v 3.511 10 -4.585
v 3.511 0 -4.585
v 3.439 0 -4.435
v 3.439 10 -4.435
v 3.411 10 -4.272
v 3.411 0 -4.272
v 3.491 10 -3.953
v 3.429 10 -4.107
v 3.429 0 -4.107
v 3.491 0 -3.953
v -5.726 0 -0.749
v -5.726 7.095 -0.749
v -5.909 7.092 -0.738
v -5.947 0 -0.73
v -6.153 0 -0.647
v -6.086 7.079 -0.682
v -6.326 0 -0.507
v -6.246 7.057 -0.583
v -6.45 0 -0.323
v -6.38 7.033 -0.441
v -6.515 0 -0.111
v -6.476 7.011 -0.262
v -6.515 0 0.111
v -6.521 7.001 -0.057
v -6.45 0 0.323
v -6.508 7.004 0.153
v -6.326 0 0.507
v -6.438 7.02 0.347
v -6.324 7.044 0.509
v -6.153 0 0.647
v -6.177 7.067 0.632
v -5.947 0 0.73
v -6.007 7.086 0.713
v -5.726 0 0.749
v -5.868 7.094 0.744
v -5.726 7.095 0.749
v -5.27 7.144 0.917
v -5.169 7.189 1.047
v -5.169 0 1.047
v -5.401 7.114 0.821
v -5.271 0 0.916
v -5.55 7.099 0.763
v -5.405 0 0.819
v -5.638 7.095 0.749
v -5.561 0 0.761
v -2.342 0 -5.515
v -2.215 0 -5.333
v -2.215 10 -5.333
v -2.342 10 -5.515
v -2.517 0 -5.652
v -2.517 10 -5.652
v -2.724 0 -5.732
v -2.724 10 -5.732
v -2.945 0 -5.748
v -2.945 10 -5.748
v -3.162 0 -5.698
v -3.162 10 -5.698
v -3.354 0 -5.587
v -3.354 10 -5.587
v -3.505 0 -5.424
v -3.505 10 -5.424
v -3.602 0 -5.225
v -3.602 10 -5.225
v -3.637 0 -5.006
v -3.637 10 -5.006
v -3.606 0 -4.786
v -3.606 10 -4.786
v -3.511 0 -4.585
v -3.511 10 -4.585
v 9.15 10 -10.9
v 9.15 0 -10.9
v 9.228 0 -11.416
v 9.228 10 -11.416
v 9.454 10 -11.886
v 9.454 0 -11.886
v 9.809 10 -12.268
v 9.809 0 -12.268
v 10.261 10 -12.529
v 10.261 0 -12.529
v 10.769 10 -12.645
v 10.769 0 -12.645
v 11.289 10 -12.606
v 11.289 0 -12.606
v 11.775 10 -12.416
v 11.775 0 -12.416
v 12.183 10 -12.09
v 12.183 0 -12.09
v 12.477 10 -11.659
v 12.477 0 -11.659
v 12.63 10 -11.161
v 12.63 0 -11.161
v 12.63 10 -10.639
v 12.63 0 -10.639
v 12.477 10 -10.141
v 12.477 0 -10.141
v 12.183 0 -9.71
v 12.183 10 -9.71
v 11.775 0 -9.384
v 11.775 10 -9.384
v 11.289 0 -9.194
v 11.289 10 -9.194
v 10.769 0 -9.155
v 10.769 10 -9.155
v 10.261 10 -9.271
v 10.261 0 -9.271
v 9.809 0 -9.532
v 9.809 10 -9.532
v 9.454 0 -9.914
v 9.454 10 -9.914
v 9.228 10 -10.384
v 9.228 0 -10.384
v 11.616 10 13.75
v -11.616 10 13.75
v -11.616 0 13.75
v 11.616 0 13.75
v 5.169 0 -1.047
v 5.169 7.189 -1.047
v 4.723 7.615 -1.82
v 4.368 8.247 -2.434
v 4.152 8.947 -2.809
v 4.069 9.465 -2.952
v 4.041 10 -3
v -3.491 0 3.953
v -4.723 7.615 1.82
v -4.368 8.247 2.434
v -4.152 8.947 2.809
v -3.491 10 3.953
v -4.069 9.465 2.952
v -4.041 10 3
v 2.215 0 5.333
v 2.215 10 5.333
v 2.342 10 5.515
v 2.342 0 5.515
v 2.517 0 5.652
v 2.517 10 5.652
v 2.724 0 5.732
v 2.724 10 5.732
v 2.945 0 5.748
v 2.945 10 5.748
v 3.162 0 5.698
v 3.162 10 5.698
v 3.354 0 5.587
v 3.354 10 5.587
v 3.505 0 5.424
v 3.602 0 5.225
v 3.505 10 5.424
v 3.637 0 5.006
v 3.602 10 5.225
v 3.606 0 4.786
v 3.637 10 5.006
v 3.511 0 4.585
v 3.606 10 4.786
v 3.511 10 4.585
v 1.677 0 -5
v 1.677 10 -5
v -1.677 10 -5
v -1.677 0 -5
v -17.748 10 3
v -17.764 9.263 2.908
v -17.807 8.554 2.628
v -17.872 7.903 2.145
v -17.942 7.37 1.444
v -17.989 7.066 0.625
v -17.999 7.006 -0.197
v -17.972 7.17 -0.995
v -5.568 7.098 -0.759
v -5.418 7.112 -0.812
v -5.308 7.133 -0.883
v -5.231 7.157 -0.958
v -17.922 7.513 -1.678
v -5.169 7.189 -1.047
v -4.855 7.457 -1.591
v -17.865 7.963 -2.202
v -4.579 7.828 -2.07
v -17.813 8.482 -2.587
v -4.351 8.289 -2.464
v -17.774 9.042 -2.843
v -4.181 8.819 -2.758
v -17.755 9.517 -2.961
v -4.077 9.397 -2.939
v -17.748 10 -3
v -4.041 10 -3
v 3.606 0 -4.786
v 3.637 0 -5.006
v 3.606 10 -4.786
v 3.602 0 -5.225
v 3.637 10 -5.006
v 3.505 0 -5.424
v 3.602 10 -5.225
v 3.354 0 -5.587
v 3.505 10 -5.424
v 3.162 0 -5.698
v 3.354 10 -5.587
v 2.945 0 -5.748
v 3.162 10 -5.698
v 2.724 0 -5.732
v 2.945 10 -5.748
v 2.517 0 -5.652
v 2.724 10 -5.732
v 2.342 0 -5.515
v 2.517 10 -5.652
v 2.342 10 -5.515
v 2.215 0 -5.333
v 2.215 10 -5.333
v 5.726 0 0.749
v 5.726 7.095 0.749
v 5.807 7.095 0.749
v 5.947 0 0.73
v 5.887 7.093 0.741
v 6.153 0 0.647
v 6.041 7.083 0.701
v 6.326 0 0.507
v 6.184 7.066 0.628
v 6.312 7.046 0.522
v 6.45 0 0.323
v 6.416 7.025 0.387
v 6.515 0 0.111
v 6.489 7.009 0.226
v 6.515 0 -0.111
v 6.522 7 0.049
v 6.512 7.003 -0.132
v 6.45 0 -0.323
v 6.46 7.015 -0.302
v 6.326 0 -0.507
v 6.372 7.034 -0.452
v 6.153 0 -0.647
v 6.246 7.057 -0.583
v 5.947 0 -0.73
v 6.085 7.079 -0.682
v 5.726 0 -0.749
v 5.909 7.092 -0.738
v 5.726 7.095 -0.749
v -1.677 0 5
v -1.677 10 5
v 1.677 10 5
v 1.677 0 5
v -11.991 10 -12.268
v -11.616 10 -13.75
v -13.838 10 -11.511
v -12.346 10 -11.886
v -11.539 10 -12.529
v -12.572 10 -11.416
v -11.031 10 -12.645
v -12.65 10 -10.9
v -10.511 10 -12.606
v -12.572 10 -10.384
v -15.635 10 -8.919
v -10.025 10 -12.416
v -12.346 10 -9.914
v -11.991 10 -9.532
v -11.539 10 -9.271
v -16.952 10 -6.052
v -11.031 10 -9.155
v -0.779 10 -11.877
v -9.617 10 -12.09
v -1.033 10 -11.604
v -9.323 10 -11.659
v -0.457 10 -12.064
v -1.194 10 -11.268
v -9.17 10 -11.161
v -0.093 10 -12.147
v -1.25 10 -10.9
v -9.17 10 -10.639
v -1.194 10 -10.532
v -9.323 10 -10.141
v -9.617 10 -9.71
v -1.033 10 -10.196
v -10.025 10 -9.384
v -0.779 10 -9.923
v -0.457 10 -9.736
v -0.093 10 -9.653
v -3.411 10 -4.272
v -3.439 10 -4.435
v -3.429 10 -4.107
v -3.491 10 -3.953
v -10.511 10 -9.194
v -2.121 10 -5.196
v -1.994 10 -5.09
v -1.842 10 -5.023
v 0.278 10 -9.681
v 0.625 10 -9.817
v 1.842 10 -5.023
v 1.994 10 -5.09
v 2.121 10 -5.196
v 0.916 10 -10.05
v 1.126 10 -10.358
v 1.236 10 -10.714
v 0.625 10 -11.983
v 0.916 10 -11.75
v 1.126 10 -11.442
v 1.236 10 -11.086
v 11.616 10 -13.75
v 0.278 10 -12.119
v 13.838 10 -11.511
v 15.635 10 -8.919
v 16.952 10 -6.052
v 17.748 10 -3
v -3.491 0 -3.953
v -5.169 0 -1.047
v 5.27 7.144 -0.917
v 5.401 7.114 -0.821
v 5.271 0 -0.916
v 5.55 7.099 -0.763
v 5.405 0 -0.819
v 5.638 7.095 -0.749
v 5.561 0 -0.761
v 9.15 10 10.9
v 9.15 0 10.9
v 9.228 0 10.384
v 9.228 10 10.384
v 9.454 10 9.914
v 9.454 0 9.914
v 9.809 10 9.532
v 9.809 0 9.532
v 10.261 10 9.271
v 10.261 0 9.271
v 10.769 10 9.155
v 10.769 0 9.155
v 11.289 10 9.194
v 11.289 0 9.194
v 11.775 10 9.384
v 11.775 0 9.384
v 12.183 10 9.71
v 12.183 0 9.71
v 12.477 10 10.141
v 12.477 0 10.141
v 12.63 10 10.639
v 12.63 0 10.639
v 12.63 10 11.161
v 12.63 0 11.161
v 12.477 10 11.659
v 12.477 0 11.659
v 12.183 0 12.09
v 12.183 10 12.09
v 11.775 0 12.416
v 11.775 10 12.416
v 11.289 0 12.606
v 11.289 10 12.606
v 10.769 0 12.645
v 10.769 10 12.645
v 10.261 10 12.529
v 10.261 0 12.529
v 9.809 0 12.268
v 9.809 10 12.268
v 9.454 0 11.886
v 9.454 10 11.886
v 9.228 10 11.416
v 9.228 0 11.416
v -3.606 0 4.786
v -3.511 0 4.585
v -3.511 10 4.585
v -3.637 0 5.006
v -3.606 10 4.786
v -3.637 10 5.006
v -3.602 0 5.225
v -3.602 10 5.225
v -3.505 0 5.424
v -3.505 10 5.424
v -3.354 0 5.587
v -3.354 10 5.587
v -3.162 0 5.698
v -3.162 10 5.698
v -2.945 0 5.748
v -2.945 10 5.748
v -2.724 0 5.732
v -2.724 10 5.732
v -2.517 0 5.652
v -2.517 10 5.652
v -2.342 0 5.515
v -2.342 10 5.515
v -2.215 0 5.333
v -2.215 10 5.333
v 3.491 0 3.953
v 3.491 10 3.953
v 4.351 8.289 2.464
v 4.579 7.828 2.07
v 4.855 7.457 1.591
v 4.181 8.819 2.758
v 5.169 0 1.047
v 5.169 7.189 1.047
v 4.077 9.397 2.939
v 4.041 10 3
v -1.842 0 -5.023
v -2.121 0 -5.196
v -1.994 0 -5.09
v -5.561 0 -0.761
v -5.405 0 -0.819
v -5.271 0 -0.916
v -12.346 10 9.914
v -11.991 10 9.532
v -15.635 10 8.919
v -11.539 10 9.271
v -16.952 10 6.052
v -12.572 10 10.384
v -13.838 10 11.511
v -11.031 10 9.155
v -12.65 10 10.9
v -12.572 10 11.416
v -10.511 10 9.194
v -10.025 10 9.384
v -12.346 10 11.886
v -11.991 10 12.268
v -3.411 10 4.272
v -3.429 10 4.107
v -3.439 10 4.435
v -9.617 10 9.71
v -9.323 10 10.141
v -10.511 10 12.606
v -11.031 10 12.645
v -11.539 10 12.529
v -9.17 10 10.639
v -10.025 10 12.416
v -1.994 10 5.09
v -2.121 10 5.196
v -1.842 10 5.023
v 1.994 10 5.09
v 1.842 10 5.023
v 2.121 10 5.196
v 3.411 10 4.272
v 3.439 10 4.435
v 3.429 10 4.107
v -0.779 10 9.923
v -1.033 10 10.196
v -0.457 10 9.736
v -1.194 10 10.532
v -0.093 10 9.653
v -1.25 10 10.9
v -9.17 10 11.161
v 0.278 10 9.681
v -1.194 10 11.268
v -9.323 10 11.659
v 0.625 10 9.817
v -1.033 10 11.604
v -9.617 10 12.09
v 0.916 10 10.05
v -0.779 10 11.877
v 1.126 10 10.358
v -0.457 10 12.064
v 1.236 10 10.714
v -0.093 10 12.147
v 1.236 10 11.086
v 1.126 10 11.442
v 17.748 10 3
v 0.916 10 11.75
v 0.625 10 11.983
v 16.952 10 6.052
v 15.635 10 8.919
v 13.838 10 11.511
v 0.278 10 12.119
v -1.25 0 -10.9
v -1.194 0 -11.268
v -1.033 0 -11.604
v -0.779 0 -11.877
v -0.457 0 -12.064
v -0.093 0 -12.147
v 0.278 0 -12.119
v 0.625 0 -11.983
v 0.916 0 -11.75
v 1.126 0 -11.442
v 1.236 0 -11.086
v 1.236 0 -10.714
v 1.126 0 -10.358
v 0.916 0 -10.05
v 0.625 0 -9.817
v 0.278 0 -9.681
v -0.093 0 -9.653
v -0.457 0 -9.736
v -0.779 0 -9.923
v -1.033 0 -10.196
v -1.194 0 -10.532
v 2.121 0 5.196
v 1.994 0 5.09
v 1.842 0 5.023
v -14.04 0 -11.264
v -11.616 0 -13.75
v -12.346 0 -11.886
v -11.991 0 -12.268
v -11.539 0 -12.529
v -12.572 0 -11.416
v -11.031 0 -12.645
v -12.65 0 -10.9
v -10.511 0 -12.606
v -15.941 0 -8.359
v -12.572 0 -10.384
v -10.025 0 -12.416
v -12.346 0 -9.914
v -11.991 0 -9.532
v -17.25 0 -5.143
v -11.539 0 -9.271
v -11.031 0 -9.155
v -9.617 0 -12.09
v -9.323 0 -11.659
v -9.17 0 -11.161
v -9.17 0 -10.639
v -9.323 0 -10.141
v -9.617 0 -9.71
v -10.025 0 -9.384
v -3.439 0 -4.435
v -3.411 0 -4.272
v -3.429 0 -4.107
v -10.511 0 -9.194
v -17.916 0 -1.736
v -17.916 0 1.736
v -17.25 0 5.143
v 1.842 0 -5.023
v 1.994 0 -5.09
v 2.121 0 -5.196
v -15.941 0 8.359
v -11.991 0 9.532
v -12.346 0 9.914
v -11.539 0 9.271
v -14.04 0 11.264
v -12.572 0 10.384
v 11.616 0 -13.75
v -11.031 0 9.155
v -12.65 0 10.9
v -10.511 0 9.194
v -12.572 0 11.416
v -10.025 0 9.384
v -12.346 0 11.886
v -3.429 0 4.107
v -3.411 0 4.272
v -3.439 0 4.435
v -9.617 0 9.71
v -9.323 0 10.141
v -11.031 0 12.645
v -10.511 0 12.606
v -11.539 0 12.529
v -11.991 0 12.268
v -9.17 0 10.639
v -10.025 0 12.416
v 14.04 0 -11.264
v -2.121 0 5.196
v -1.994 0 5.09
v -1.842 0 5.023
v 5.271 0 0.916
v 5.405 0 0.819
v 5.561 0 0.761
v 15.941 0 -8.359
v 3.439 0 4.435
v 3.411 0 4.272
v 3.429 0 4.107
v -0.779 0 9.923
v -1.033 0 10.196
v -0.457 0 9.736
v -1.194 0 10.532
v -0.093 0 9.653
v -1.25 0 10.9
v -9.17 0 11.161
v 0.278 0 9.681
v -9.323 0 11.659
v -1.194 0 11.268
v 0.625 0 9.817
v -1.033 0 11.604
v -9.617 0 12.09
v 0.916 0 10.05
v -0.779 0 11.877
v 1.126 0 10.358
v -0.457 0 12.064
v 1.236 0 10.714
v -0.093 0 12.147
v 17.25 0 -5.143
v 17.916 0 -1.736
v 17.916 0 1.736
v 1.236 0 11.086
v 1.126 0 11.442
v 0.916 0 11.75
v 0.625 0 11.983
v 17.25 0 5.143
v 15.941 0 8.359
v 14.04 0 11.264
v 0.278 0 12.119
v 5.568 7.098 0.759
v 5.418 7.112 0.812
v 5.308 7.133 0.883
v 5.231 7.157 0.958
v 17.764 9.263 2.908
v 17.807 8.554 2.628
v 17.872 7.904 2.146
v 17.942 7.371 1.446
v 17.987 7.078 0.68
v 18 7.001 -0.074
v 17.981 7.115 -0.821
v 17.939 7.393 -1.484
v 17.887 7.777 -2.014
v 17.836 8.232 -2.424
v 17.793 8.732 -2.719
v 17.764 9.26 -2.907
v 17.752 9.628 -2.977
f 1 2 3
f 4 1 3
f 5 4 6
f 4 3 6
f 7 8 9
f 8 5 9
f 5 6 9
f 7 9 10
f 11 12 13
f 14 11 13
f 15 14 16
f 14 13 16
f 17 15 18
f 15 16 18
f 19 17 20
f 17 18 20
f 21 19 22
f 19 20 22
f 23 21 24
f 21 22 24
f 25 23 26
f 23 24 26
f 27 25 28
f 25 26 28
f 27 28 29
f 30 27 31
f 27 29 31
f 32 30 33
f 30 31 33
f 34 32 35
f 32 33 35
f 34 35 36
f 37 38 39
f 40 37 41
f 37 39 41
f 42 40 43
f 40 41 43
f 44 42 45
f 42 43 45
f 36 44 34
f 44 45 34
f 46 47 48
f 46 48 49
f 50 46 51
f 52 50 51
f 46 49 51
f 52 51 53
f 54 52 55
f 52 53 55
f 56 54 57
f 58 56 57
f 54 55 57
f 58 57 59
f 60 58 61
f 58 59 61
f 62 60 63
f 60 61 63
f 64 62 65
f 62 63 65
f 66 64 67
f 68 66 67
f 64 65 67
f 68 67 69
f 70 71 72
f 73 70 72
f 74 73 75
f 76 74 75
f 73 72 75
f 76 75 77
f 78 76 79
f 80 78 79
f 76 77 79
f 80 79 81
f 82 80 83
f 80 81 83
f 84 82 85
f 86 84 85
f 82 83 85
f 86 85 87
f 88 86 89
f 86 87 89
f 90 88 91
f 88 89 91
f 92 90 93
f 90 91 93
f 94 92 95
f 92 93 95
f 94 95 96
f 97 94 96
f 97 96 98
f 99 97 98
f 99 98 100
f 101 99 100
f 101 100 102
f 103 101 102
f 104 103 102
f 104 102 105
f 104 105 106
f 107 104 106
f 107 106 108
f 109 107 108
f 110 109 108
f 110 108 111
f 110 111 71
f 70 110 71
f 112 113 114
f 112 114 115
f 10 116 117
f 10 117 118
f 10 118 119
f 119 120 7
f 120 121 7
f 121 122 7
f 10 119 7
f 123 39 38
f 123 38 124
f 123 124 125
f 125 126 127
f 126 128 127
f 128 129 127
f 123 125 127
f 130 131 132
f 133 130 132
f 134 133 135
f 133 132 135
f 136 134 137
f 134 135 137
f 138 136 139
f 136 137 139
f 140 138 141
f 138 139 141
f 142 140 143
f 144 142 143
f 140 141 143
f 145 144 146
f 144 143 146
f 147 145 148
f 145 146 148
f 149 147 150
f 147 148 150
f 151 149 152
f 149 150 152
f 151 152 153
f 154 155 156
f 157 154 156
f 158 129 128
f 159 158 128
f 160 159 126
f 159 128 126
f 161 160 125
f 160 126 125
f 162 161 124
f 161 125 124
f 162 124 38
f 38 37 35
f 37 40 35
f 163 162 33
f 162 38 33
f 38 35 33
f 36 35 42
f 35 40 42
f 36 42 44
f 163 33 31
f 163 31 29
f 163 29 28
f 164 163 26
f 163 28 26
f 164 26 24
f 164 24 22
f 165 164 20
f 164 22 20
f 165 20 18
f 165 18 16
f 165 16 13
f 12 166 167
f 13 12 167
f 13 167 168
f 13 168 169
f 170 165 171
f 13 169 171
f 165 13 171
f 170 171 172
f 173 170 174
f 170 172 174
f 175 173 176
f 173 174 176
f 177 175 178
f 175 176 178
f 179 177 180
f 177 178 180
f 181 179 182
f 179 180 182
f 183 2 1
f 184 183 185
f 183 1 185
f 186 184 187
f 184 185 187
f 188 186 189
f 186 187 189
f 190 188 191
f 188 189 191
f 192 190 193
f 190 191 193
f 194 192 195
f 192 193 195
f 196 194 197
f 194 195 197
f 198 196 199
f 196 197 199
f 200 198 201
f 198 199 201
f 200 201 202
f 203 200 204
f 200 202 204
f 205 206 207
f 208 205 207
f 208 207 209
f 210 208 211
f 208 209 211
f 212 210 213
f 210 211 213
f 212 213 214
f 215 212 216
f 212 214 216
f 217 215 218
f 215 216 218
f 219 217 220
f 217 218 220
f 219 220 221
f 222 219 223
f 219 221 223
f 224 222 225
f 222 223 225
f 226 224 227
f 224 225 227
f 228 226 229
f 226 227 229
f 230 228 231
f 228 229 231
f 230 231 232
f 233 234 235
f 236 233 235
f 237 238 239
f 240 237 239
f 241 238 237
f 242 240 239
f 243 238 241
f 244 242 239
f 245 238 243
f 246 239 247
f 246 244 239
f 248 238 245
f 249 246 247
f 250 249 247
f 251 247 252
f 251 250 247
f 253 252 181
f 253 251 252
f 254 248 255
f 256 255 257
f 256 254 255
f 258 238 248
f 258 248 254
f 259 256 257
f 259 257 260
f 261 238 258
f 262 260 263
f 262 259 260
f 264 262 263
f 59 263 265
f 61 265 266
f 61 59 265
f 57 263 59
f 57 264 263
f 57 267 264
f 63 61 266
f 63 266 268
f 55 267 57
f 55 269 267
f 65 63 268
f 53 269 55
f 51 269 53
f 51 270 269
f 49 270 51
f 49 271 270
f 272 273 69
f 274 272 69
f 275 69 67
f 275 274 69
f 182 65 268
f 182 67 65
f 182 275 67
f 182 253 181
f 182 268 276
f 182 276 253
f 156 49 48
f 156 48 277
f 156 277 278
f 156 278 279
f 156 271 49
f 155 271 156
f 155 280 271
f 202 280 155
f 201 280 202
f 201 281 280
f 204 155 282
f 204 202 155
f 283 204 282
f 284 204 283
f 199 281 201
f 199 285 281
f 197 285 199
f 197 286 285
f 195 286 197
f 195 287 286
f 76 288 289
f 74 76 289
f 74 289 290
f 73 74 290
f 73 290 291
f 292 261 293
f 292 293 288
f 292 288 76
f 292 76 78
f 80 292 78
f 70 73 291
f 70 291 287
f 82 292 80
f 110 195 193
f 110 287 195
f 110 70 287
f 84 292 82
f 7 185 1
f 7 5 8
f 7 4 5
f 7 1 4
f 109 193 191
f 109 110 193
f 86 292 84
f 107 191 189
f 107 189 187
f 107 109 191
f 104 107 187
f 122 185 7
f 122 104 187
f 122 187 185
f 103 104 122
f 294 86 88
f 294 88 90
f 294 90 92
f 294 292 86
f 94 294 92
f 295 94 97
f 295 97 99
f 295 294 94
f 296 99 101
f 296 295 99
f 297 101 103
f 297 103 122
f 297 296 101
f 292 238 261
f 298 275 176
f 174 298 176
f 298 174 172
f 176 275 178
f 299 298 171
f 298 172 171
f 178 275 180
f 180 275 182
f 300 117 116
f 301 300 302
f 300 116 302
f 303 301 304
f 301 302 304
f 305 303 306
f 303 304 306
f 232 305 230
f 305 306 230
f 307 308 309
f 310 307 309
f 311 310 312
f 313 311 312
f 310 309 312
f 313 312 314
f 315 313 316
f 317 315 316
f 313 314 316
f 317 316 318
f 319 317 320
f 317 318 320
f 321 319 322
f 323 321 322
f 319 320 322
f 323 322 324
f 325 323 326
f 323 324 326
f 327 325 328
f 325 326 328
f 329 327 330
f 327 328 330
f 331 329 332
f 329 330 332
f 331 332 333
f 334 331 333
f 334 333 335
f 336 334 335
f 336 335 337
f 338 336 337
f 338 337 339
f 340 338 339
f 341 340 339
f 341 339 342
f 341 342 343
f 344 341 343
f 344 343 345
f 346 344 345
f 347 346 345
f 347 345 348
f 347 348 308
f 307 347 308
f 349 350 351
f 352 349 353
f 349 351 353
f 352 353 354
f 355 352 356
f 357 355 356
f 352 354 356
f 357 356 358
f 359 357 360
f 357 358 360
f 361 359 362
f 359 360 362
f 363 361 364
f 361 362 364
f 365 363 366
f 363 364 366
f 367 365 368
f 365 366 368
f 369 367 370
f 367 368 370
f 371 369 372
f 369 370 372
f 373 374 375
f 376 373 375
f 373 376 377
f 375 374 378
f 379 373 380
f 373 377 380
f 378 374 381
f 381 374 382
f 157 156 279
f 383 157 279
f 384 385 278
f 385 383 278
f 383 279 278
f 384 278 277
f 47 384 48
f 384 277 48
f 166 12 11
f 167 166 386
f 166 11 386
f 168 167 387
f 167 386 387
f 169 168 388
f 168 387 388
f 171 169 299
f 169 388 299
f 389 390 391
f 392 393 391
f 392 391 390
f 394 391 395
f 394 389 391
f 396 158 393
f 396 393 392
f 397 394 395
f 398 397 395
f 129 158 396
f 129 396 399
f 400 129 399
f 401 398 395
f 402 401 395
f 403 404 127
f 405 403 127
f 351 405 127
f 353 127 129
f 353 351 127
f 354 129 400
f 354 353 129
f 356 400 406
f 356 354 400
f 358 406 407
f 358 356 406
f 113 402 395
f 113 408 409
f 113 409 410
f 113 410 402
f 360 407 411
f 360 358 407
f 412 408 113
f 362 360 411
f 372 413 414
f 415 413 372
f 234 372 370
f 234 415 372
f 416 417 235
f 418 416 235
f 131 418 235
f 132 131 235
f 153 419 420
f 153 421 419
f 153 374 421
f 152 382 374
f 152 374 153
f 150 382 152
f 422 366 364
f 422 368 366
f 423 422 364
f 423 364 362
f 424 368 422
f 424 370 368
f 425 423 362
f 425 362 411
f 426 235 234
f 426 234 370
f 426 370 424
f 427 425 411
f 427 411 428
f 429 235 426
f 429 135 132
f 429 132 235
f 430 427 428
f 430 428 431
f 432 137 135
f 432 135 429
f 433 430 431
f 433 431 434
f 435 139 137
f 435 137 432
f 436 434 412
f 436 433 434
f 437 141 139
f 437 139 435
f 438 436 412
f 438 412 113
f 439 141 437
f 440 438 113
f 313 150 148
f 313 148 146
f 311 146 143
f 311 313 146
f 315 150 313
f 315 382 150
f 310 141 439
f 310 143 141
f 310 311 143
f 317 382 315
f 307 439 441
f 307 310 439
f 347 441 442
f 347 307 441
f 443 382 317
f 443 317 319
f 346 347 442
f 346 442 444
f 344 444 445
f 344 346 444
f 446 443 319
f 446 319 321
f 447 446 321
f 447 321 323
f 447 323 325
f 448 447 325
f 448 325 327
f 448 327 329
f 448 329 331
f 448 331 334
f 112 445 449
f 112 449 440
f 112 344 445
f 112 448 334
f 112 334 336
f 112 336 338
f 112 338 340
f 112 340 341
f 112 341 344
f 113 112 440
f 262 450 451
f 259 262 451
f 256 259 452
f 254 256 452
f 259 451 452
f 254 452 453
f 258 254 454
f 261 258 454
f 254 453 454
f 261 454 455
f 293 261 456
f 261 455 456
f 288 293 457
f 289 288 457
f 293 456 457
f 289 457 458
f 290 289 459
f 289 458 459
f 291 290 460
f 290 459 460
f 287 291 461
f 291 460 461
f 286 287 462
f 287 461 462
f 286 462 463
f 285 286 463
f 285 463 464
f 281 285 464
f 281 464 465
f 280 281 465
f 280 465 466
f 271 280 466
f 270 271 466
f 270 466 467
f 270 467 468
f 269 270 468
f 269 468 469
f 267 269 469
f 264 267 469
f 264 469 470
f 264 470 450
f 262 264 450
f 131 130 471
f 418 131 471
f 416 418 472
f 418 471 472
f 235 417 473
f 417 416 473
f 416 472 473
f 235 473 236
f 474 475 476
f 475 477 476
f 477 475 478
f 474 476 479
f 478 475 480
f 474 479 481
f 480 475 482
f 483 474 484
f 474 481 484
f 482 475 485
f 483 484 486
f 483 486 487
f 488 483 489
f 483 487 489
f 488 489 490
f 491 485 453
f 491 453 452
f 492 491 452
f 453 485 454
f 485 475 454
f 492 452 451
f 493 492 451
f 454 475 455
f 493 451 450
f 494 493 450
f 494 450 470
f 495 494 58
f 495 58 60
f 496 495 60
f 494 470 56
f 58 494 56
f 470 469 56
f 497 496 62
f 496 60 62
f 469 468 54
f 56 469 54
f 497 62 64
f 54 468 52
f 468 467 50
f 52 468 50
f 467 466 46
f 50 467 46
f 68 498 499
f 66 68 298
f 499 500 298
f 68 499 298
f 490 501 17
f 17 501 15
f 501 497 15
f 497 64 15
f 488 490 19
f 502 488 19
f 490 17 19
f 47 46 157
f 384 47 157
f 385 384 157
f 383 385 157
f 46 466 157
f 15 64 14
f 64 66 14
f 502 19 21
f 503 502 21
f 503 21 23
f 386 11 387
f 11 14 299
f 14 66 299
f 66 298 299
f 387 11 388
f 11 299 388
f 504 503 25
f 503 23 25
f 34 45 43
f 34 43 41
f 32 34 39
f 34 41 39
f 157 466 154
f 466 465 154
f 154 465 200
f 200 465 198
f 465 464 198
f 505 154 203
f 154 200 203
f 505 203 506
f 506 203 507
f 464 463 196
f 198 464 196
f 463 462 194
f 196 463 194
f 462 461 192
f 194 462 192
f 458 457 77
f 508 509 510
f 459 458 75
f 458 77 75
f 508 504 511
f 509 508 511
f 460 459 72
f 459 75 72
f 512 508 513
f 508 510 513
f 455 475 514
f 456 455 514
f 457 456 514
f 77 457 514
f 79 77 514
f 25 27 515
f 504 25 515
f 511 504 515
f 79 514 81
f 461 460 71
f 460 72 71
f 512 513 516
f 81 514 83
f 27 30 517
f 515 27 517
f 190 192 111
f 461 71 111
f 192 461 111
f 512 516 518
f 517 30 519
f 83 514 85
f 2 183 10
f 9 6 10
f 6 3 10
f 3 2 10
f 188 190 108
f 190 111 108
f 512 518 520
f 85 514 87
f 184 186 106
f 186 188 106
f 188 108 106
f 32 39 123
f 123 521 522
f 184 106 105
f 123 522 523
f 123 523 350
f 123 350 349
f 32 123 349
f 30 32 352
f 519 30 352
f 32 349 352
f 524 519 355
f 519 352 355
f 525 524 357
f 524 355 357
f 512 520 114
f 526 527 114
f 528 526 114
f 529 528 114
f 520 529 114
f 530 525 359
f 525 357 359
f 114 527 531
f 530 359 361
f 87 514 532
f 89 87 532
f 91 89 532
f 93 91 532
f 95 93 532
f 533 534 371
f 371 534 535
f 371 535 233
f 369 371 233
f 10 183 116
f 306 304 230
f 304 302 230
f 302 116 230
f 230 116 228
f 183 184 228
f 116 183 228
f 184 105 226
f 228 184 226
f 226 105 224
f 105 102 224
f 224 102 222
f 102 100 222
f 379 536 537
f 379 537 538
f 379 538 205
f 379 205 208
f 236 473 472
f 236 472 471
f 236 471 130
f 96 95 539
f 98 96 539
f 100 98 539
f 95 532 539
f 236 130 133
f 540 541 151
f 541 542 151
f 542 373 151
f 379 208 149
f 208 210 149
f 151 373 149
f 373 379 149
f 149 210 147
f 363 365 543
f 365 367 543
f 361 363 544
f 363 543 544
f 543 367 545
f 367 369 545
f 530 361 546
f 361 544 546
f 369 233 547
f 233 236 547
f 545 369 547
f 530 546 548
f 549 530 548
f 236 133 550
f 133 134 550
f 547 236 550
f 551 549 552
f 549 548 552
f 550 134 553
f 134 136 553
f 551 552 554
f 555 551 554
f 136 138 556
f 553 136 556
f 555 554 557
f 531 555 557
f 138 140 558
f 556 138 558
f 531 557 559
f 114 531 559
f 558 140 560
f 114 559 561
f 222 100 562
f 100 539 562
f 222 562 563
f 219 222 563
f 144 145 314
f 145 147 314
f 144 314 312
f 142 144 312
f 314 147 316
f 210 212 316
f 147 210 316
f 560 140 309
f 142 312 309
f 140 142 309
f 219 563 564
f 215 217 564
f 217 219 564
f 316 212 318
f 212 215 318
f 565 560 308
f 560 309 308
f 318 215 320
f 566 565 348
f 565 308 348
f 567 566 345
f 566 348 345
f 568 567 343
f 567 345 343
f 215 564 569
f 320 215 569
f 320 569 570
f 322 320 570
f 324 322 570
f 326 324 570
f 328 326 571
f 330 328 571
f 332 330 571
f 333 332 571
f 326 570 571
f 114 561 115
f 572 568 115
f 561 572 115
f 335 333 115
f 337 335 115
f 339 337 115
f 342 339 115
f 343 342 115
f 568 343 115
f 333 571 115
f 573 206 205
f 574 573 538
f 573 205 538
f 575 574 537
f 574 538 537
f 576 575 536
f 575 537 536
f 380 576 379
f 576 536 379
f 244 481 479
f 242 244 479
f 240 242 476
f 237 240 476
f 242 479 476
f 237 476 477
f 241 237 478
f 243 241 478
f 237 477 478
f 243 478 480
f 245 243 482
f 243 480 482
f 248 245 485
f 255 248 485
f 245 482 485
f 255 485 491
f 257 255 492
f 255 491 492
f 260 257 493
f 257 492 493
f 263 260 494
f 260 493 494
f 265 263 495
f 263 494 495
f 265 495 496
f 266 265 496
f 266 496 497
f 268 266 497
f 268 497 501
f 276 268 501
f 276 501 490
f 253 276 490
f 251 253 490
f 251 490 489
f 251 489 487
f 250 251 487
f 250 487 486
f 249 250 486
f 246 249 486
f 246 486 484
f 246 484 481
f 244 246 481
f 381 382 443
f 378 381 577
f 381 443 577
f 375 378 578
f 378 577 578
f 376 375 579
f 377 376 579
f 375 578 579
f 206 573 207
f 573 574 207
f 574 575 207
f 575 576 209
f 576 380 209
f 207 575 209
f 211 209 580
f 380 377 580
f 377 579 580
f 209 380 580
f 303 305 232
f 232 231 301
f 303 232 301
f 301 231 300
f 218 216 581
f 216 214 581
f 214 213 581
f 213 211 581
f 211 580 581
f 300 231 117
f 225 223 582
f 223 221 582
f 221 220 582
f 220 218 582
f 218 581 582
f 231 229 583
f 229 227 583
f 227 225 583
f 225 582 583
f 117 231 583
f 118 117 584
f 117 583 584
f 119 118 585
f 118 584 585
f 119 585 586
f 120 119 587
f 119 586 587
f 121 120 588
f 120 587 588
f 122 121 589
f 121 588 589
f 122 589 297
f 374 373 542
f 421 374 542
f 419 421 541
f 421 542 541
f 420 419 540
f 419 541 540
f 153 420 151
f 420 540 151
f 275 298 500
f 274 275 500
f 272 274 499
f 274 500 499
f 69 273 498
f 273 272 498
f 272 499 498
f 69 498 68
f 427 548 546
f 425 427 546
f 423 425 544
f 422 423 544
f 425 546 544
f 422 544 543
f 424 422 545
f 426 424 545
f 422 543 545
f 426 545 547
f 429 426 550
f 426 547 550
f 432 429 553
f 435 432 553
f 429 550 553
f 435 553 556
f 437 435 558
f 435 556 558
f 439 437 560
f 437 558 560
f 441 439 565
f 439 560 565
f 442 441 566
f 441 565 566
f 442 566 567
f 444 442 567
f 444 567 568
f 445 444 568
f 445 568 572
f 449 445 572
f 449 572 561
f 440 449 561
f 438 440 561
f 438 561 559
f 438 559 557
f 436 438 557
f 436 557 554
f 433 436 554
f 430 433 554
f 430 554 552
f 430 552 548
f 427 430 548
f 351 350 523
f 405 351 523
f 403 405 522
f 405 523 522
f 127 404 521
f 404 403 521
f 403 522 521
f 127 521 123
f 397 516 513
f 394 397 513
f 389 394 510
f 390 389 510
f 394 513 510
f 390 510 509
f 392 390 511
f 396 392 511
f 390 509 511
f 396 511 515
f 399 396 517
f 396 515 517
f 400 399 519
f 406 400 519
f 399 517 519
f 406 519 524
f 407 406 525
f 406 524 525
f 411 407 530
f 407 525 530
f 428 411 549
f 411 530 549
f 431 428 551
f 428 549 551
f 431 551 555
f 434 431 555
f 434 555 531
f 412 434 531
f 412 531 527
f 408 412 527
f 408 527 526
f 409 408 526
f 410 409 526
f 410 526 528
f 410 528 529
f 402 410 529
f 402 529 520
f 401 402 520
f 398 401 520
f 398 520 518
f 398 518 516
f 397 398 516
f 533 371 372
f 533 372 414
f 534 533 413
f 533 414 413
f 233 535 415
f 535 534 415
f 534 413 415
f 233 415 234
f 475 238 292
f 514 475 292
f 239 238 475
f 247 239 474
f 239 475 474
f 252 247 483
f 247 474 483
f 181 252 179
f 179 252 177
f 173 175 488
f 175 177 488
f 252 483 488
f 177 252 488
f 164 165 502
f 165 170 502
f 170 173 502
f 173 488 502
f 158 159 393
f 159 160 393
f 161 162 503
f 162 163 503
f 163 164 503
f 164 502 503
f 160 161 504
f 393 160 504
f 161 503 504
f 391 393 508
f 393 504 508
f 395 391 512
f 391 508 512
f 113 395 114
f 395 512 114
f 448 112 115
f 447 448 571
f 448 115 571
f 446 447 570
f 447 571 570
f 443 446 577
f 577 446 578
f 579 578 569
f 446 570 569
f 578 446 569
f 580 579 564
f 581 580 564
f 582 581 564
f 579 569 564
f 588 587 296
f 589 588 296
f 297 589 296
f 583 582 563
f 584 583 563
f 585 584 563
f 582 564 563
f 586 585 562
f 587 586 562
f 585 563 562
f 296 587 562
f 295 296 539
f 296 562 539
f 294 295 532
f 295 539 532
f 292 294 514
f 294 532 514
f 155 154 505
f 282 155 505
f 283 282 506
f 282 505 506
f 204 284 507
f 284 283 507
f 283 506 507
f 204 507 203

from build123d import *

# Parameters (mm, degrees)
SKIZZE1_R                        = 18
AUFSATZ_LINEAR_AUSTRAGEN1_DEPTH  = 10
SKIZZE2_OUTSIDE_W                = 48.376
SKIZZE2_OUTSIDE_H                = 48.376
SKIZZE2_OUTSIDE_W_2              = 36
SKIZZE2_OUTSIDE_H_2              = 27.5
SCHNITT_LINEAR_AUSTRAGEN1_DEPTH  = 10
SCHNITT_LINEAR_AUSTRAGEN2_DEPTH  = 10
SKIZZE4_R                        = 3
SCHNITT_LINEAR_AUSTRAGEN3_DEPTH  = 22.5
M3_GEWINDEBOHRUNG1_D             = 2.5
F_3_5_3_5_DURCHMESSER_BOHRUNG1_D = 3.5
SKIZZE9_R                        = 0.75
SCHNITT_LINEAR_AUSTRAGEN4_DEPTH  = 10
VERRUNDUNG1_R                    = 0.6


with BuildPart() as part:
    # Skizze1 → Aufsatz-Linear austragen1 (new body)
    with BuildSketch(Plane(origin=(0, 0, 0), x_dir=(1, 0, 0), z_dir=(0, 1, 0))):
        with Locations(Location((0, 0, 0), (0, 0, 270))):
            Circle(SKIZZE1_R)
    extrude(amount=AUFSATZ_LINEAR_AUSTRAGEN1_DEPTH)

    # Skizze2 outside → Schnitt-Linear austragen1 (cut)
    with BuildSketch(Plane(origin=(0, 10, 0), x_dir=(1, 0, 0), z_dir=(0, 1, 0))):
        Rectangle(SKIZZE2_OUTSIDE_W, SKIZZE2_OUTSIDE_H)
        Rectangle(SKIZZE2_OUTSIDE_W_2, SKIZZE2_OUTSIDE_H_2, mode=Mode.SUBTRACT)
    extrude(amount=-SCHNITT_LINEAR_AUSTRAGEN1_DEPTH, mode=Mode.SUBTRACT)

    # Skizze3 → Schnitt-Linear austragen2 (cut)
    with BuildSketch(Plane(origin=(0, 10, 0), x_dir=(1, 0, 0), z_dir=(0, 1, 0))):
        Polygon((2.886751346, 5), (-2.886751346, 5), (-5.773502692, 0), (-2.886751346, -5), (2.886751346, -5), (5.773502692, 0), align=None)
    extrude(amount=-SCHNITT_LINEAR_AUSTRAGEN2_DEPTH, mode=Mode.SUBTRACT)

    # Skizze4 → Schnitt-Linear austragen3 (cut, symmetric)
    with BuildSketch(Plane(origin=(0, 0, 0), x_dir=(0, 0, -1), z_dir=(1, 0, 0))):
        with Locations((0, 10)):
            Circle(SKIZZE4_R)
    extrude(amount=SCHNITT_LINEAR_AUSTRAGEN3_DEPTH, both=True, mode=Mode.SUBTRACT)

    # M3 Gewindebohrung1 (through all)
    with Locations(Plane(origin=(0, 10, 0), x_dir=(1, 0, 0), z_dir=(0, 1, 0))):
        with Locations((0, 10.9), (0, -10.9)):
            Hole(M3_GEWINDEBOHRUNG1_D / 2)

    # Ø3.5 (3.5) Durchmesser Bohrung1 (through all)
    with Locations(Plane(origin=(0, 10, 0), x_dir=(1, 0, 0), z_dir=(0, 1, 0))):
        with Locations((-10.9, 10.9), (10.9, 10.9), (10.9, -10.9), (-10.9, -10.9)):
            Hole(F_3_5_3_5_DURCHMESSER_BOHRUNG1_D / 2)

    # Skizze9 → Schnitt-Linear austragen4 (cut)
    with BuildSketch(Plane(origin=(0, 10, 0), x_dir=(1, 0, 0), z_dir=(0, 1, 0))):
        with Locations((-2.886751346, 5)):
            Circle(SKIZZE9_R)
        with Locations((2.886751346, 5)):
            Circle(SKIZZE9_R)
        with Locations((5.773502692, 0)):
            Circle(SKIZZE9_R)
        with Locations((2.886751346, -5)):
            Circle(SKIZZE9_R)
        with Locations((-2.886751346, -5)):
            Circle(SKIZZE9_R)
        with Locations((-5.773502692, 0)):
            Circle(SKIZZE9_R)
    extrude(amount=-SCHNITT_LINEAR_AUSTRAGEN4_DEPTH, mode=Mode.SUBTRACT)

    # Verrundung1
    # the kernel refuses this fillet: 0.6 mm, written as the material it takes off along each edge
    with BuildSketch(Plane(origin=(5.398502692, -1.148346656, -0.649519053), x_dir=(-0.4999999999999986, 0, -0.8660254037844394), z_dir=(0, 1, 0))) as verrundung1_piece_1:
        with BuildLine():
            CenterArc((0.459338662, -0.6), VERRUNDUNG1_R, 90, 63.612200039)
            ThreePointArc((-0.078145188, -0.333333333), (-0.019797593, -0.171185412), (0, 0))
            Line((0, 0), (0.459338662, 0))
        make_face()
    extrude(amount=9.367849683, mode=Mode.SUBTRACT)
    with BuildSketch(Plane(origin=(5.398502692, -1.148346656, 0.649519053), x_dir=(0.9572887202141677, 0, 0.2891337167310671), z_dir=(0, 1, 0))) as verrundung1_piece_2:
        with BuildLine():
            CenterArc((0.479319154, -0.584161925), VERRUNDUNG1_R, 103.193899981, 63.612200039)
            Line((-0.104842771, -0.447213595), (0, 0))
            ThreePointArc((0, 0), (0.171185412, -0.019797593), (0.342370824, 0))
        make_face()
    extrude(amount=9.367849683, mode=Mode.SUBTRACT)
    with BuildSketch(Plane(origin=(3.261751346, -1.148346656, 4.350480947), x_dir=(0.5000000000000002, 0, -0.8660254037844385), z_dir=(0, 1, 0)), Plane(origin=(-3.261751346, -1.148346656, -4.350480947), x_dir=(-0.5000000000000006, 0, 0.8660254037844383), z_dir=(0, 1, 0)), Plane(origin=(2.136751346, -1.148346656, -5), x_dir=(-1, 0, 0), z_dir=(0, 1, 0))) as verrundung1_piece_3:
        with BuildLine():
            CenterArc((0.459338662, -0.6), VERRUNDUNG1_R, 90, 63.612200039)
            ThreePointArc((-0.078145188, -0.333333333), (-0.019797593, -0.171185412), (0, 0))
            Line((0, 0), (0.459338662, 0))
        make_face()
    extrude(amount=12.296693311, mode=Mode.SUBTRACT)
    with BuildSketch(Plane(origin=(2.136751346, -1.148346656, 5), x_dir=(0.22824721632736691, 0, 0.9736032088272965), z_dir=(0, 1, 0)), Plane(origin=(-3.261751346, -1.148346656, 4.350480947), x_dir=(-0.7290415038868022, 0, 0.684469492096229), z_dir=(0, 1, 0)), Plane(origin=(3.261751346, -1.148346656, -4.350480947), x_dir=(0.7290415038868017, 0, -0.6844694920962296), z_dir=(0, 1, 0))) as verrundung1_piece_4:
        with BuildLine():
            CenterArc((0.479319154, -0.584161925), VERRUNDUNG1_R, 103.193899981, 63.612200039)
            Line((-0.104842771, -0.447213595), (0, 0))
            ThreePointArc((0, 0), (0.171185412, -0.019797593), (0.342370824, 0))
        make_face()
    extrude(amount=12.296693311, mode=Mode.SUBTRACT)
    with BuildSketch(Plane(origin=(-2.136751346, 11.148346656, 5), x_dir=(1, 0, 0), z_dir=(0, -1, 0))) as verrundung1_piece_5:
        with BuildLine():
            CenterArc((0.459338662, 0.6), VERRUNDUNG1_R, 206.387799961, 63.612200039)
            ThreePointArc((-0.078145188, 0.333333333), (-0.019797593, 0.171185412), (0, 0))
            Line((0, 0), (0.459338662, 0))
        make_face()
    extrude(amount=12.296693311, mode=Mode.SUBTRACT)
    with BuildSketch(Plane(origin=(-5.398502692, -1.148346656, 0.649519053), x_dir=(-0.9572887202141677, 0, 0.2891337167310672), z_dir=(0, 1, 0))) as verrundung1_piece_6:
        with BuildLine():
            CenterArc((0.479319154, 0.584161925), VERRUNDUNG1_R, 193.193899981, 63.612200039)
            Line((-0.104842771, 0.447213595), (0, 0))
            ThreePointArc((0, 0), (0.171185412, 0.019797593), (0.342370824, 0))
        make_face()
    extrude(amount=9.367849683, mode=Mode.SUBTRACT)
    with BuildSketch(Plane(origin=(-5.398502692, -1.148346656, -0.649519053), x_dir=(0.5000000000000002, 0, -0.8660254037844385), z_dir=(0, 1, 0))) as verrundung1_piece_7:
        with BuildLine():
            CenterArc((0.459338662, 0.6), VERRUNDUNG1_R, 206.387799961, 63.612200039)
            ThreePointArc((-0.078145188, 0.333333333), (-0.019797593, 0.171185412), (0, 0))
            Line((0, 0), (0.459338662, 0))
        make_face()
    extrude(amount=9.367849683, mode=Mode.SUBTRACT)
    with BuildSketch(Plane(origin=(-2.136751346, 11.148346656, -5), x_dir=(-0.22824721632736567, 0, -0.9736032088272967), z_dir=(0, -1, 0))) as verrundung1_piece_8:
        with BuildLine():
            CenterArc((0.479319154, 0.584161925), VERRUNDUNG1_R, 193.193899981, 63.612200039)
            Line((-0.104842771, 0.447213595), (0, 0))
            ThreePointArc((0, 0), (0.171185412, 0.019797593), (0.342370824, 0))
        make_face()
    extrude(amount=12.296693311, mode=Mode.SUBTRACT)


solid = part.part
